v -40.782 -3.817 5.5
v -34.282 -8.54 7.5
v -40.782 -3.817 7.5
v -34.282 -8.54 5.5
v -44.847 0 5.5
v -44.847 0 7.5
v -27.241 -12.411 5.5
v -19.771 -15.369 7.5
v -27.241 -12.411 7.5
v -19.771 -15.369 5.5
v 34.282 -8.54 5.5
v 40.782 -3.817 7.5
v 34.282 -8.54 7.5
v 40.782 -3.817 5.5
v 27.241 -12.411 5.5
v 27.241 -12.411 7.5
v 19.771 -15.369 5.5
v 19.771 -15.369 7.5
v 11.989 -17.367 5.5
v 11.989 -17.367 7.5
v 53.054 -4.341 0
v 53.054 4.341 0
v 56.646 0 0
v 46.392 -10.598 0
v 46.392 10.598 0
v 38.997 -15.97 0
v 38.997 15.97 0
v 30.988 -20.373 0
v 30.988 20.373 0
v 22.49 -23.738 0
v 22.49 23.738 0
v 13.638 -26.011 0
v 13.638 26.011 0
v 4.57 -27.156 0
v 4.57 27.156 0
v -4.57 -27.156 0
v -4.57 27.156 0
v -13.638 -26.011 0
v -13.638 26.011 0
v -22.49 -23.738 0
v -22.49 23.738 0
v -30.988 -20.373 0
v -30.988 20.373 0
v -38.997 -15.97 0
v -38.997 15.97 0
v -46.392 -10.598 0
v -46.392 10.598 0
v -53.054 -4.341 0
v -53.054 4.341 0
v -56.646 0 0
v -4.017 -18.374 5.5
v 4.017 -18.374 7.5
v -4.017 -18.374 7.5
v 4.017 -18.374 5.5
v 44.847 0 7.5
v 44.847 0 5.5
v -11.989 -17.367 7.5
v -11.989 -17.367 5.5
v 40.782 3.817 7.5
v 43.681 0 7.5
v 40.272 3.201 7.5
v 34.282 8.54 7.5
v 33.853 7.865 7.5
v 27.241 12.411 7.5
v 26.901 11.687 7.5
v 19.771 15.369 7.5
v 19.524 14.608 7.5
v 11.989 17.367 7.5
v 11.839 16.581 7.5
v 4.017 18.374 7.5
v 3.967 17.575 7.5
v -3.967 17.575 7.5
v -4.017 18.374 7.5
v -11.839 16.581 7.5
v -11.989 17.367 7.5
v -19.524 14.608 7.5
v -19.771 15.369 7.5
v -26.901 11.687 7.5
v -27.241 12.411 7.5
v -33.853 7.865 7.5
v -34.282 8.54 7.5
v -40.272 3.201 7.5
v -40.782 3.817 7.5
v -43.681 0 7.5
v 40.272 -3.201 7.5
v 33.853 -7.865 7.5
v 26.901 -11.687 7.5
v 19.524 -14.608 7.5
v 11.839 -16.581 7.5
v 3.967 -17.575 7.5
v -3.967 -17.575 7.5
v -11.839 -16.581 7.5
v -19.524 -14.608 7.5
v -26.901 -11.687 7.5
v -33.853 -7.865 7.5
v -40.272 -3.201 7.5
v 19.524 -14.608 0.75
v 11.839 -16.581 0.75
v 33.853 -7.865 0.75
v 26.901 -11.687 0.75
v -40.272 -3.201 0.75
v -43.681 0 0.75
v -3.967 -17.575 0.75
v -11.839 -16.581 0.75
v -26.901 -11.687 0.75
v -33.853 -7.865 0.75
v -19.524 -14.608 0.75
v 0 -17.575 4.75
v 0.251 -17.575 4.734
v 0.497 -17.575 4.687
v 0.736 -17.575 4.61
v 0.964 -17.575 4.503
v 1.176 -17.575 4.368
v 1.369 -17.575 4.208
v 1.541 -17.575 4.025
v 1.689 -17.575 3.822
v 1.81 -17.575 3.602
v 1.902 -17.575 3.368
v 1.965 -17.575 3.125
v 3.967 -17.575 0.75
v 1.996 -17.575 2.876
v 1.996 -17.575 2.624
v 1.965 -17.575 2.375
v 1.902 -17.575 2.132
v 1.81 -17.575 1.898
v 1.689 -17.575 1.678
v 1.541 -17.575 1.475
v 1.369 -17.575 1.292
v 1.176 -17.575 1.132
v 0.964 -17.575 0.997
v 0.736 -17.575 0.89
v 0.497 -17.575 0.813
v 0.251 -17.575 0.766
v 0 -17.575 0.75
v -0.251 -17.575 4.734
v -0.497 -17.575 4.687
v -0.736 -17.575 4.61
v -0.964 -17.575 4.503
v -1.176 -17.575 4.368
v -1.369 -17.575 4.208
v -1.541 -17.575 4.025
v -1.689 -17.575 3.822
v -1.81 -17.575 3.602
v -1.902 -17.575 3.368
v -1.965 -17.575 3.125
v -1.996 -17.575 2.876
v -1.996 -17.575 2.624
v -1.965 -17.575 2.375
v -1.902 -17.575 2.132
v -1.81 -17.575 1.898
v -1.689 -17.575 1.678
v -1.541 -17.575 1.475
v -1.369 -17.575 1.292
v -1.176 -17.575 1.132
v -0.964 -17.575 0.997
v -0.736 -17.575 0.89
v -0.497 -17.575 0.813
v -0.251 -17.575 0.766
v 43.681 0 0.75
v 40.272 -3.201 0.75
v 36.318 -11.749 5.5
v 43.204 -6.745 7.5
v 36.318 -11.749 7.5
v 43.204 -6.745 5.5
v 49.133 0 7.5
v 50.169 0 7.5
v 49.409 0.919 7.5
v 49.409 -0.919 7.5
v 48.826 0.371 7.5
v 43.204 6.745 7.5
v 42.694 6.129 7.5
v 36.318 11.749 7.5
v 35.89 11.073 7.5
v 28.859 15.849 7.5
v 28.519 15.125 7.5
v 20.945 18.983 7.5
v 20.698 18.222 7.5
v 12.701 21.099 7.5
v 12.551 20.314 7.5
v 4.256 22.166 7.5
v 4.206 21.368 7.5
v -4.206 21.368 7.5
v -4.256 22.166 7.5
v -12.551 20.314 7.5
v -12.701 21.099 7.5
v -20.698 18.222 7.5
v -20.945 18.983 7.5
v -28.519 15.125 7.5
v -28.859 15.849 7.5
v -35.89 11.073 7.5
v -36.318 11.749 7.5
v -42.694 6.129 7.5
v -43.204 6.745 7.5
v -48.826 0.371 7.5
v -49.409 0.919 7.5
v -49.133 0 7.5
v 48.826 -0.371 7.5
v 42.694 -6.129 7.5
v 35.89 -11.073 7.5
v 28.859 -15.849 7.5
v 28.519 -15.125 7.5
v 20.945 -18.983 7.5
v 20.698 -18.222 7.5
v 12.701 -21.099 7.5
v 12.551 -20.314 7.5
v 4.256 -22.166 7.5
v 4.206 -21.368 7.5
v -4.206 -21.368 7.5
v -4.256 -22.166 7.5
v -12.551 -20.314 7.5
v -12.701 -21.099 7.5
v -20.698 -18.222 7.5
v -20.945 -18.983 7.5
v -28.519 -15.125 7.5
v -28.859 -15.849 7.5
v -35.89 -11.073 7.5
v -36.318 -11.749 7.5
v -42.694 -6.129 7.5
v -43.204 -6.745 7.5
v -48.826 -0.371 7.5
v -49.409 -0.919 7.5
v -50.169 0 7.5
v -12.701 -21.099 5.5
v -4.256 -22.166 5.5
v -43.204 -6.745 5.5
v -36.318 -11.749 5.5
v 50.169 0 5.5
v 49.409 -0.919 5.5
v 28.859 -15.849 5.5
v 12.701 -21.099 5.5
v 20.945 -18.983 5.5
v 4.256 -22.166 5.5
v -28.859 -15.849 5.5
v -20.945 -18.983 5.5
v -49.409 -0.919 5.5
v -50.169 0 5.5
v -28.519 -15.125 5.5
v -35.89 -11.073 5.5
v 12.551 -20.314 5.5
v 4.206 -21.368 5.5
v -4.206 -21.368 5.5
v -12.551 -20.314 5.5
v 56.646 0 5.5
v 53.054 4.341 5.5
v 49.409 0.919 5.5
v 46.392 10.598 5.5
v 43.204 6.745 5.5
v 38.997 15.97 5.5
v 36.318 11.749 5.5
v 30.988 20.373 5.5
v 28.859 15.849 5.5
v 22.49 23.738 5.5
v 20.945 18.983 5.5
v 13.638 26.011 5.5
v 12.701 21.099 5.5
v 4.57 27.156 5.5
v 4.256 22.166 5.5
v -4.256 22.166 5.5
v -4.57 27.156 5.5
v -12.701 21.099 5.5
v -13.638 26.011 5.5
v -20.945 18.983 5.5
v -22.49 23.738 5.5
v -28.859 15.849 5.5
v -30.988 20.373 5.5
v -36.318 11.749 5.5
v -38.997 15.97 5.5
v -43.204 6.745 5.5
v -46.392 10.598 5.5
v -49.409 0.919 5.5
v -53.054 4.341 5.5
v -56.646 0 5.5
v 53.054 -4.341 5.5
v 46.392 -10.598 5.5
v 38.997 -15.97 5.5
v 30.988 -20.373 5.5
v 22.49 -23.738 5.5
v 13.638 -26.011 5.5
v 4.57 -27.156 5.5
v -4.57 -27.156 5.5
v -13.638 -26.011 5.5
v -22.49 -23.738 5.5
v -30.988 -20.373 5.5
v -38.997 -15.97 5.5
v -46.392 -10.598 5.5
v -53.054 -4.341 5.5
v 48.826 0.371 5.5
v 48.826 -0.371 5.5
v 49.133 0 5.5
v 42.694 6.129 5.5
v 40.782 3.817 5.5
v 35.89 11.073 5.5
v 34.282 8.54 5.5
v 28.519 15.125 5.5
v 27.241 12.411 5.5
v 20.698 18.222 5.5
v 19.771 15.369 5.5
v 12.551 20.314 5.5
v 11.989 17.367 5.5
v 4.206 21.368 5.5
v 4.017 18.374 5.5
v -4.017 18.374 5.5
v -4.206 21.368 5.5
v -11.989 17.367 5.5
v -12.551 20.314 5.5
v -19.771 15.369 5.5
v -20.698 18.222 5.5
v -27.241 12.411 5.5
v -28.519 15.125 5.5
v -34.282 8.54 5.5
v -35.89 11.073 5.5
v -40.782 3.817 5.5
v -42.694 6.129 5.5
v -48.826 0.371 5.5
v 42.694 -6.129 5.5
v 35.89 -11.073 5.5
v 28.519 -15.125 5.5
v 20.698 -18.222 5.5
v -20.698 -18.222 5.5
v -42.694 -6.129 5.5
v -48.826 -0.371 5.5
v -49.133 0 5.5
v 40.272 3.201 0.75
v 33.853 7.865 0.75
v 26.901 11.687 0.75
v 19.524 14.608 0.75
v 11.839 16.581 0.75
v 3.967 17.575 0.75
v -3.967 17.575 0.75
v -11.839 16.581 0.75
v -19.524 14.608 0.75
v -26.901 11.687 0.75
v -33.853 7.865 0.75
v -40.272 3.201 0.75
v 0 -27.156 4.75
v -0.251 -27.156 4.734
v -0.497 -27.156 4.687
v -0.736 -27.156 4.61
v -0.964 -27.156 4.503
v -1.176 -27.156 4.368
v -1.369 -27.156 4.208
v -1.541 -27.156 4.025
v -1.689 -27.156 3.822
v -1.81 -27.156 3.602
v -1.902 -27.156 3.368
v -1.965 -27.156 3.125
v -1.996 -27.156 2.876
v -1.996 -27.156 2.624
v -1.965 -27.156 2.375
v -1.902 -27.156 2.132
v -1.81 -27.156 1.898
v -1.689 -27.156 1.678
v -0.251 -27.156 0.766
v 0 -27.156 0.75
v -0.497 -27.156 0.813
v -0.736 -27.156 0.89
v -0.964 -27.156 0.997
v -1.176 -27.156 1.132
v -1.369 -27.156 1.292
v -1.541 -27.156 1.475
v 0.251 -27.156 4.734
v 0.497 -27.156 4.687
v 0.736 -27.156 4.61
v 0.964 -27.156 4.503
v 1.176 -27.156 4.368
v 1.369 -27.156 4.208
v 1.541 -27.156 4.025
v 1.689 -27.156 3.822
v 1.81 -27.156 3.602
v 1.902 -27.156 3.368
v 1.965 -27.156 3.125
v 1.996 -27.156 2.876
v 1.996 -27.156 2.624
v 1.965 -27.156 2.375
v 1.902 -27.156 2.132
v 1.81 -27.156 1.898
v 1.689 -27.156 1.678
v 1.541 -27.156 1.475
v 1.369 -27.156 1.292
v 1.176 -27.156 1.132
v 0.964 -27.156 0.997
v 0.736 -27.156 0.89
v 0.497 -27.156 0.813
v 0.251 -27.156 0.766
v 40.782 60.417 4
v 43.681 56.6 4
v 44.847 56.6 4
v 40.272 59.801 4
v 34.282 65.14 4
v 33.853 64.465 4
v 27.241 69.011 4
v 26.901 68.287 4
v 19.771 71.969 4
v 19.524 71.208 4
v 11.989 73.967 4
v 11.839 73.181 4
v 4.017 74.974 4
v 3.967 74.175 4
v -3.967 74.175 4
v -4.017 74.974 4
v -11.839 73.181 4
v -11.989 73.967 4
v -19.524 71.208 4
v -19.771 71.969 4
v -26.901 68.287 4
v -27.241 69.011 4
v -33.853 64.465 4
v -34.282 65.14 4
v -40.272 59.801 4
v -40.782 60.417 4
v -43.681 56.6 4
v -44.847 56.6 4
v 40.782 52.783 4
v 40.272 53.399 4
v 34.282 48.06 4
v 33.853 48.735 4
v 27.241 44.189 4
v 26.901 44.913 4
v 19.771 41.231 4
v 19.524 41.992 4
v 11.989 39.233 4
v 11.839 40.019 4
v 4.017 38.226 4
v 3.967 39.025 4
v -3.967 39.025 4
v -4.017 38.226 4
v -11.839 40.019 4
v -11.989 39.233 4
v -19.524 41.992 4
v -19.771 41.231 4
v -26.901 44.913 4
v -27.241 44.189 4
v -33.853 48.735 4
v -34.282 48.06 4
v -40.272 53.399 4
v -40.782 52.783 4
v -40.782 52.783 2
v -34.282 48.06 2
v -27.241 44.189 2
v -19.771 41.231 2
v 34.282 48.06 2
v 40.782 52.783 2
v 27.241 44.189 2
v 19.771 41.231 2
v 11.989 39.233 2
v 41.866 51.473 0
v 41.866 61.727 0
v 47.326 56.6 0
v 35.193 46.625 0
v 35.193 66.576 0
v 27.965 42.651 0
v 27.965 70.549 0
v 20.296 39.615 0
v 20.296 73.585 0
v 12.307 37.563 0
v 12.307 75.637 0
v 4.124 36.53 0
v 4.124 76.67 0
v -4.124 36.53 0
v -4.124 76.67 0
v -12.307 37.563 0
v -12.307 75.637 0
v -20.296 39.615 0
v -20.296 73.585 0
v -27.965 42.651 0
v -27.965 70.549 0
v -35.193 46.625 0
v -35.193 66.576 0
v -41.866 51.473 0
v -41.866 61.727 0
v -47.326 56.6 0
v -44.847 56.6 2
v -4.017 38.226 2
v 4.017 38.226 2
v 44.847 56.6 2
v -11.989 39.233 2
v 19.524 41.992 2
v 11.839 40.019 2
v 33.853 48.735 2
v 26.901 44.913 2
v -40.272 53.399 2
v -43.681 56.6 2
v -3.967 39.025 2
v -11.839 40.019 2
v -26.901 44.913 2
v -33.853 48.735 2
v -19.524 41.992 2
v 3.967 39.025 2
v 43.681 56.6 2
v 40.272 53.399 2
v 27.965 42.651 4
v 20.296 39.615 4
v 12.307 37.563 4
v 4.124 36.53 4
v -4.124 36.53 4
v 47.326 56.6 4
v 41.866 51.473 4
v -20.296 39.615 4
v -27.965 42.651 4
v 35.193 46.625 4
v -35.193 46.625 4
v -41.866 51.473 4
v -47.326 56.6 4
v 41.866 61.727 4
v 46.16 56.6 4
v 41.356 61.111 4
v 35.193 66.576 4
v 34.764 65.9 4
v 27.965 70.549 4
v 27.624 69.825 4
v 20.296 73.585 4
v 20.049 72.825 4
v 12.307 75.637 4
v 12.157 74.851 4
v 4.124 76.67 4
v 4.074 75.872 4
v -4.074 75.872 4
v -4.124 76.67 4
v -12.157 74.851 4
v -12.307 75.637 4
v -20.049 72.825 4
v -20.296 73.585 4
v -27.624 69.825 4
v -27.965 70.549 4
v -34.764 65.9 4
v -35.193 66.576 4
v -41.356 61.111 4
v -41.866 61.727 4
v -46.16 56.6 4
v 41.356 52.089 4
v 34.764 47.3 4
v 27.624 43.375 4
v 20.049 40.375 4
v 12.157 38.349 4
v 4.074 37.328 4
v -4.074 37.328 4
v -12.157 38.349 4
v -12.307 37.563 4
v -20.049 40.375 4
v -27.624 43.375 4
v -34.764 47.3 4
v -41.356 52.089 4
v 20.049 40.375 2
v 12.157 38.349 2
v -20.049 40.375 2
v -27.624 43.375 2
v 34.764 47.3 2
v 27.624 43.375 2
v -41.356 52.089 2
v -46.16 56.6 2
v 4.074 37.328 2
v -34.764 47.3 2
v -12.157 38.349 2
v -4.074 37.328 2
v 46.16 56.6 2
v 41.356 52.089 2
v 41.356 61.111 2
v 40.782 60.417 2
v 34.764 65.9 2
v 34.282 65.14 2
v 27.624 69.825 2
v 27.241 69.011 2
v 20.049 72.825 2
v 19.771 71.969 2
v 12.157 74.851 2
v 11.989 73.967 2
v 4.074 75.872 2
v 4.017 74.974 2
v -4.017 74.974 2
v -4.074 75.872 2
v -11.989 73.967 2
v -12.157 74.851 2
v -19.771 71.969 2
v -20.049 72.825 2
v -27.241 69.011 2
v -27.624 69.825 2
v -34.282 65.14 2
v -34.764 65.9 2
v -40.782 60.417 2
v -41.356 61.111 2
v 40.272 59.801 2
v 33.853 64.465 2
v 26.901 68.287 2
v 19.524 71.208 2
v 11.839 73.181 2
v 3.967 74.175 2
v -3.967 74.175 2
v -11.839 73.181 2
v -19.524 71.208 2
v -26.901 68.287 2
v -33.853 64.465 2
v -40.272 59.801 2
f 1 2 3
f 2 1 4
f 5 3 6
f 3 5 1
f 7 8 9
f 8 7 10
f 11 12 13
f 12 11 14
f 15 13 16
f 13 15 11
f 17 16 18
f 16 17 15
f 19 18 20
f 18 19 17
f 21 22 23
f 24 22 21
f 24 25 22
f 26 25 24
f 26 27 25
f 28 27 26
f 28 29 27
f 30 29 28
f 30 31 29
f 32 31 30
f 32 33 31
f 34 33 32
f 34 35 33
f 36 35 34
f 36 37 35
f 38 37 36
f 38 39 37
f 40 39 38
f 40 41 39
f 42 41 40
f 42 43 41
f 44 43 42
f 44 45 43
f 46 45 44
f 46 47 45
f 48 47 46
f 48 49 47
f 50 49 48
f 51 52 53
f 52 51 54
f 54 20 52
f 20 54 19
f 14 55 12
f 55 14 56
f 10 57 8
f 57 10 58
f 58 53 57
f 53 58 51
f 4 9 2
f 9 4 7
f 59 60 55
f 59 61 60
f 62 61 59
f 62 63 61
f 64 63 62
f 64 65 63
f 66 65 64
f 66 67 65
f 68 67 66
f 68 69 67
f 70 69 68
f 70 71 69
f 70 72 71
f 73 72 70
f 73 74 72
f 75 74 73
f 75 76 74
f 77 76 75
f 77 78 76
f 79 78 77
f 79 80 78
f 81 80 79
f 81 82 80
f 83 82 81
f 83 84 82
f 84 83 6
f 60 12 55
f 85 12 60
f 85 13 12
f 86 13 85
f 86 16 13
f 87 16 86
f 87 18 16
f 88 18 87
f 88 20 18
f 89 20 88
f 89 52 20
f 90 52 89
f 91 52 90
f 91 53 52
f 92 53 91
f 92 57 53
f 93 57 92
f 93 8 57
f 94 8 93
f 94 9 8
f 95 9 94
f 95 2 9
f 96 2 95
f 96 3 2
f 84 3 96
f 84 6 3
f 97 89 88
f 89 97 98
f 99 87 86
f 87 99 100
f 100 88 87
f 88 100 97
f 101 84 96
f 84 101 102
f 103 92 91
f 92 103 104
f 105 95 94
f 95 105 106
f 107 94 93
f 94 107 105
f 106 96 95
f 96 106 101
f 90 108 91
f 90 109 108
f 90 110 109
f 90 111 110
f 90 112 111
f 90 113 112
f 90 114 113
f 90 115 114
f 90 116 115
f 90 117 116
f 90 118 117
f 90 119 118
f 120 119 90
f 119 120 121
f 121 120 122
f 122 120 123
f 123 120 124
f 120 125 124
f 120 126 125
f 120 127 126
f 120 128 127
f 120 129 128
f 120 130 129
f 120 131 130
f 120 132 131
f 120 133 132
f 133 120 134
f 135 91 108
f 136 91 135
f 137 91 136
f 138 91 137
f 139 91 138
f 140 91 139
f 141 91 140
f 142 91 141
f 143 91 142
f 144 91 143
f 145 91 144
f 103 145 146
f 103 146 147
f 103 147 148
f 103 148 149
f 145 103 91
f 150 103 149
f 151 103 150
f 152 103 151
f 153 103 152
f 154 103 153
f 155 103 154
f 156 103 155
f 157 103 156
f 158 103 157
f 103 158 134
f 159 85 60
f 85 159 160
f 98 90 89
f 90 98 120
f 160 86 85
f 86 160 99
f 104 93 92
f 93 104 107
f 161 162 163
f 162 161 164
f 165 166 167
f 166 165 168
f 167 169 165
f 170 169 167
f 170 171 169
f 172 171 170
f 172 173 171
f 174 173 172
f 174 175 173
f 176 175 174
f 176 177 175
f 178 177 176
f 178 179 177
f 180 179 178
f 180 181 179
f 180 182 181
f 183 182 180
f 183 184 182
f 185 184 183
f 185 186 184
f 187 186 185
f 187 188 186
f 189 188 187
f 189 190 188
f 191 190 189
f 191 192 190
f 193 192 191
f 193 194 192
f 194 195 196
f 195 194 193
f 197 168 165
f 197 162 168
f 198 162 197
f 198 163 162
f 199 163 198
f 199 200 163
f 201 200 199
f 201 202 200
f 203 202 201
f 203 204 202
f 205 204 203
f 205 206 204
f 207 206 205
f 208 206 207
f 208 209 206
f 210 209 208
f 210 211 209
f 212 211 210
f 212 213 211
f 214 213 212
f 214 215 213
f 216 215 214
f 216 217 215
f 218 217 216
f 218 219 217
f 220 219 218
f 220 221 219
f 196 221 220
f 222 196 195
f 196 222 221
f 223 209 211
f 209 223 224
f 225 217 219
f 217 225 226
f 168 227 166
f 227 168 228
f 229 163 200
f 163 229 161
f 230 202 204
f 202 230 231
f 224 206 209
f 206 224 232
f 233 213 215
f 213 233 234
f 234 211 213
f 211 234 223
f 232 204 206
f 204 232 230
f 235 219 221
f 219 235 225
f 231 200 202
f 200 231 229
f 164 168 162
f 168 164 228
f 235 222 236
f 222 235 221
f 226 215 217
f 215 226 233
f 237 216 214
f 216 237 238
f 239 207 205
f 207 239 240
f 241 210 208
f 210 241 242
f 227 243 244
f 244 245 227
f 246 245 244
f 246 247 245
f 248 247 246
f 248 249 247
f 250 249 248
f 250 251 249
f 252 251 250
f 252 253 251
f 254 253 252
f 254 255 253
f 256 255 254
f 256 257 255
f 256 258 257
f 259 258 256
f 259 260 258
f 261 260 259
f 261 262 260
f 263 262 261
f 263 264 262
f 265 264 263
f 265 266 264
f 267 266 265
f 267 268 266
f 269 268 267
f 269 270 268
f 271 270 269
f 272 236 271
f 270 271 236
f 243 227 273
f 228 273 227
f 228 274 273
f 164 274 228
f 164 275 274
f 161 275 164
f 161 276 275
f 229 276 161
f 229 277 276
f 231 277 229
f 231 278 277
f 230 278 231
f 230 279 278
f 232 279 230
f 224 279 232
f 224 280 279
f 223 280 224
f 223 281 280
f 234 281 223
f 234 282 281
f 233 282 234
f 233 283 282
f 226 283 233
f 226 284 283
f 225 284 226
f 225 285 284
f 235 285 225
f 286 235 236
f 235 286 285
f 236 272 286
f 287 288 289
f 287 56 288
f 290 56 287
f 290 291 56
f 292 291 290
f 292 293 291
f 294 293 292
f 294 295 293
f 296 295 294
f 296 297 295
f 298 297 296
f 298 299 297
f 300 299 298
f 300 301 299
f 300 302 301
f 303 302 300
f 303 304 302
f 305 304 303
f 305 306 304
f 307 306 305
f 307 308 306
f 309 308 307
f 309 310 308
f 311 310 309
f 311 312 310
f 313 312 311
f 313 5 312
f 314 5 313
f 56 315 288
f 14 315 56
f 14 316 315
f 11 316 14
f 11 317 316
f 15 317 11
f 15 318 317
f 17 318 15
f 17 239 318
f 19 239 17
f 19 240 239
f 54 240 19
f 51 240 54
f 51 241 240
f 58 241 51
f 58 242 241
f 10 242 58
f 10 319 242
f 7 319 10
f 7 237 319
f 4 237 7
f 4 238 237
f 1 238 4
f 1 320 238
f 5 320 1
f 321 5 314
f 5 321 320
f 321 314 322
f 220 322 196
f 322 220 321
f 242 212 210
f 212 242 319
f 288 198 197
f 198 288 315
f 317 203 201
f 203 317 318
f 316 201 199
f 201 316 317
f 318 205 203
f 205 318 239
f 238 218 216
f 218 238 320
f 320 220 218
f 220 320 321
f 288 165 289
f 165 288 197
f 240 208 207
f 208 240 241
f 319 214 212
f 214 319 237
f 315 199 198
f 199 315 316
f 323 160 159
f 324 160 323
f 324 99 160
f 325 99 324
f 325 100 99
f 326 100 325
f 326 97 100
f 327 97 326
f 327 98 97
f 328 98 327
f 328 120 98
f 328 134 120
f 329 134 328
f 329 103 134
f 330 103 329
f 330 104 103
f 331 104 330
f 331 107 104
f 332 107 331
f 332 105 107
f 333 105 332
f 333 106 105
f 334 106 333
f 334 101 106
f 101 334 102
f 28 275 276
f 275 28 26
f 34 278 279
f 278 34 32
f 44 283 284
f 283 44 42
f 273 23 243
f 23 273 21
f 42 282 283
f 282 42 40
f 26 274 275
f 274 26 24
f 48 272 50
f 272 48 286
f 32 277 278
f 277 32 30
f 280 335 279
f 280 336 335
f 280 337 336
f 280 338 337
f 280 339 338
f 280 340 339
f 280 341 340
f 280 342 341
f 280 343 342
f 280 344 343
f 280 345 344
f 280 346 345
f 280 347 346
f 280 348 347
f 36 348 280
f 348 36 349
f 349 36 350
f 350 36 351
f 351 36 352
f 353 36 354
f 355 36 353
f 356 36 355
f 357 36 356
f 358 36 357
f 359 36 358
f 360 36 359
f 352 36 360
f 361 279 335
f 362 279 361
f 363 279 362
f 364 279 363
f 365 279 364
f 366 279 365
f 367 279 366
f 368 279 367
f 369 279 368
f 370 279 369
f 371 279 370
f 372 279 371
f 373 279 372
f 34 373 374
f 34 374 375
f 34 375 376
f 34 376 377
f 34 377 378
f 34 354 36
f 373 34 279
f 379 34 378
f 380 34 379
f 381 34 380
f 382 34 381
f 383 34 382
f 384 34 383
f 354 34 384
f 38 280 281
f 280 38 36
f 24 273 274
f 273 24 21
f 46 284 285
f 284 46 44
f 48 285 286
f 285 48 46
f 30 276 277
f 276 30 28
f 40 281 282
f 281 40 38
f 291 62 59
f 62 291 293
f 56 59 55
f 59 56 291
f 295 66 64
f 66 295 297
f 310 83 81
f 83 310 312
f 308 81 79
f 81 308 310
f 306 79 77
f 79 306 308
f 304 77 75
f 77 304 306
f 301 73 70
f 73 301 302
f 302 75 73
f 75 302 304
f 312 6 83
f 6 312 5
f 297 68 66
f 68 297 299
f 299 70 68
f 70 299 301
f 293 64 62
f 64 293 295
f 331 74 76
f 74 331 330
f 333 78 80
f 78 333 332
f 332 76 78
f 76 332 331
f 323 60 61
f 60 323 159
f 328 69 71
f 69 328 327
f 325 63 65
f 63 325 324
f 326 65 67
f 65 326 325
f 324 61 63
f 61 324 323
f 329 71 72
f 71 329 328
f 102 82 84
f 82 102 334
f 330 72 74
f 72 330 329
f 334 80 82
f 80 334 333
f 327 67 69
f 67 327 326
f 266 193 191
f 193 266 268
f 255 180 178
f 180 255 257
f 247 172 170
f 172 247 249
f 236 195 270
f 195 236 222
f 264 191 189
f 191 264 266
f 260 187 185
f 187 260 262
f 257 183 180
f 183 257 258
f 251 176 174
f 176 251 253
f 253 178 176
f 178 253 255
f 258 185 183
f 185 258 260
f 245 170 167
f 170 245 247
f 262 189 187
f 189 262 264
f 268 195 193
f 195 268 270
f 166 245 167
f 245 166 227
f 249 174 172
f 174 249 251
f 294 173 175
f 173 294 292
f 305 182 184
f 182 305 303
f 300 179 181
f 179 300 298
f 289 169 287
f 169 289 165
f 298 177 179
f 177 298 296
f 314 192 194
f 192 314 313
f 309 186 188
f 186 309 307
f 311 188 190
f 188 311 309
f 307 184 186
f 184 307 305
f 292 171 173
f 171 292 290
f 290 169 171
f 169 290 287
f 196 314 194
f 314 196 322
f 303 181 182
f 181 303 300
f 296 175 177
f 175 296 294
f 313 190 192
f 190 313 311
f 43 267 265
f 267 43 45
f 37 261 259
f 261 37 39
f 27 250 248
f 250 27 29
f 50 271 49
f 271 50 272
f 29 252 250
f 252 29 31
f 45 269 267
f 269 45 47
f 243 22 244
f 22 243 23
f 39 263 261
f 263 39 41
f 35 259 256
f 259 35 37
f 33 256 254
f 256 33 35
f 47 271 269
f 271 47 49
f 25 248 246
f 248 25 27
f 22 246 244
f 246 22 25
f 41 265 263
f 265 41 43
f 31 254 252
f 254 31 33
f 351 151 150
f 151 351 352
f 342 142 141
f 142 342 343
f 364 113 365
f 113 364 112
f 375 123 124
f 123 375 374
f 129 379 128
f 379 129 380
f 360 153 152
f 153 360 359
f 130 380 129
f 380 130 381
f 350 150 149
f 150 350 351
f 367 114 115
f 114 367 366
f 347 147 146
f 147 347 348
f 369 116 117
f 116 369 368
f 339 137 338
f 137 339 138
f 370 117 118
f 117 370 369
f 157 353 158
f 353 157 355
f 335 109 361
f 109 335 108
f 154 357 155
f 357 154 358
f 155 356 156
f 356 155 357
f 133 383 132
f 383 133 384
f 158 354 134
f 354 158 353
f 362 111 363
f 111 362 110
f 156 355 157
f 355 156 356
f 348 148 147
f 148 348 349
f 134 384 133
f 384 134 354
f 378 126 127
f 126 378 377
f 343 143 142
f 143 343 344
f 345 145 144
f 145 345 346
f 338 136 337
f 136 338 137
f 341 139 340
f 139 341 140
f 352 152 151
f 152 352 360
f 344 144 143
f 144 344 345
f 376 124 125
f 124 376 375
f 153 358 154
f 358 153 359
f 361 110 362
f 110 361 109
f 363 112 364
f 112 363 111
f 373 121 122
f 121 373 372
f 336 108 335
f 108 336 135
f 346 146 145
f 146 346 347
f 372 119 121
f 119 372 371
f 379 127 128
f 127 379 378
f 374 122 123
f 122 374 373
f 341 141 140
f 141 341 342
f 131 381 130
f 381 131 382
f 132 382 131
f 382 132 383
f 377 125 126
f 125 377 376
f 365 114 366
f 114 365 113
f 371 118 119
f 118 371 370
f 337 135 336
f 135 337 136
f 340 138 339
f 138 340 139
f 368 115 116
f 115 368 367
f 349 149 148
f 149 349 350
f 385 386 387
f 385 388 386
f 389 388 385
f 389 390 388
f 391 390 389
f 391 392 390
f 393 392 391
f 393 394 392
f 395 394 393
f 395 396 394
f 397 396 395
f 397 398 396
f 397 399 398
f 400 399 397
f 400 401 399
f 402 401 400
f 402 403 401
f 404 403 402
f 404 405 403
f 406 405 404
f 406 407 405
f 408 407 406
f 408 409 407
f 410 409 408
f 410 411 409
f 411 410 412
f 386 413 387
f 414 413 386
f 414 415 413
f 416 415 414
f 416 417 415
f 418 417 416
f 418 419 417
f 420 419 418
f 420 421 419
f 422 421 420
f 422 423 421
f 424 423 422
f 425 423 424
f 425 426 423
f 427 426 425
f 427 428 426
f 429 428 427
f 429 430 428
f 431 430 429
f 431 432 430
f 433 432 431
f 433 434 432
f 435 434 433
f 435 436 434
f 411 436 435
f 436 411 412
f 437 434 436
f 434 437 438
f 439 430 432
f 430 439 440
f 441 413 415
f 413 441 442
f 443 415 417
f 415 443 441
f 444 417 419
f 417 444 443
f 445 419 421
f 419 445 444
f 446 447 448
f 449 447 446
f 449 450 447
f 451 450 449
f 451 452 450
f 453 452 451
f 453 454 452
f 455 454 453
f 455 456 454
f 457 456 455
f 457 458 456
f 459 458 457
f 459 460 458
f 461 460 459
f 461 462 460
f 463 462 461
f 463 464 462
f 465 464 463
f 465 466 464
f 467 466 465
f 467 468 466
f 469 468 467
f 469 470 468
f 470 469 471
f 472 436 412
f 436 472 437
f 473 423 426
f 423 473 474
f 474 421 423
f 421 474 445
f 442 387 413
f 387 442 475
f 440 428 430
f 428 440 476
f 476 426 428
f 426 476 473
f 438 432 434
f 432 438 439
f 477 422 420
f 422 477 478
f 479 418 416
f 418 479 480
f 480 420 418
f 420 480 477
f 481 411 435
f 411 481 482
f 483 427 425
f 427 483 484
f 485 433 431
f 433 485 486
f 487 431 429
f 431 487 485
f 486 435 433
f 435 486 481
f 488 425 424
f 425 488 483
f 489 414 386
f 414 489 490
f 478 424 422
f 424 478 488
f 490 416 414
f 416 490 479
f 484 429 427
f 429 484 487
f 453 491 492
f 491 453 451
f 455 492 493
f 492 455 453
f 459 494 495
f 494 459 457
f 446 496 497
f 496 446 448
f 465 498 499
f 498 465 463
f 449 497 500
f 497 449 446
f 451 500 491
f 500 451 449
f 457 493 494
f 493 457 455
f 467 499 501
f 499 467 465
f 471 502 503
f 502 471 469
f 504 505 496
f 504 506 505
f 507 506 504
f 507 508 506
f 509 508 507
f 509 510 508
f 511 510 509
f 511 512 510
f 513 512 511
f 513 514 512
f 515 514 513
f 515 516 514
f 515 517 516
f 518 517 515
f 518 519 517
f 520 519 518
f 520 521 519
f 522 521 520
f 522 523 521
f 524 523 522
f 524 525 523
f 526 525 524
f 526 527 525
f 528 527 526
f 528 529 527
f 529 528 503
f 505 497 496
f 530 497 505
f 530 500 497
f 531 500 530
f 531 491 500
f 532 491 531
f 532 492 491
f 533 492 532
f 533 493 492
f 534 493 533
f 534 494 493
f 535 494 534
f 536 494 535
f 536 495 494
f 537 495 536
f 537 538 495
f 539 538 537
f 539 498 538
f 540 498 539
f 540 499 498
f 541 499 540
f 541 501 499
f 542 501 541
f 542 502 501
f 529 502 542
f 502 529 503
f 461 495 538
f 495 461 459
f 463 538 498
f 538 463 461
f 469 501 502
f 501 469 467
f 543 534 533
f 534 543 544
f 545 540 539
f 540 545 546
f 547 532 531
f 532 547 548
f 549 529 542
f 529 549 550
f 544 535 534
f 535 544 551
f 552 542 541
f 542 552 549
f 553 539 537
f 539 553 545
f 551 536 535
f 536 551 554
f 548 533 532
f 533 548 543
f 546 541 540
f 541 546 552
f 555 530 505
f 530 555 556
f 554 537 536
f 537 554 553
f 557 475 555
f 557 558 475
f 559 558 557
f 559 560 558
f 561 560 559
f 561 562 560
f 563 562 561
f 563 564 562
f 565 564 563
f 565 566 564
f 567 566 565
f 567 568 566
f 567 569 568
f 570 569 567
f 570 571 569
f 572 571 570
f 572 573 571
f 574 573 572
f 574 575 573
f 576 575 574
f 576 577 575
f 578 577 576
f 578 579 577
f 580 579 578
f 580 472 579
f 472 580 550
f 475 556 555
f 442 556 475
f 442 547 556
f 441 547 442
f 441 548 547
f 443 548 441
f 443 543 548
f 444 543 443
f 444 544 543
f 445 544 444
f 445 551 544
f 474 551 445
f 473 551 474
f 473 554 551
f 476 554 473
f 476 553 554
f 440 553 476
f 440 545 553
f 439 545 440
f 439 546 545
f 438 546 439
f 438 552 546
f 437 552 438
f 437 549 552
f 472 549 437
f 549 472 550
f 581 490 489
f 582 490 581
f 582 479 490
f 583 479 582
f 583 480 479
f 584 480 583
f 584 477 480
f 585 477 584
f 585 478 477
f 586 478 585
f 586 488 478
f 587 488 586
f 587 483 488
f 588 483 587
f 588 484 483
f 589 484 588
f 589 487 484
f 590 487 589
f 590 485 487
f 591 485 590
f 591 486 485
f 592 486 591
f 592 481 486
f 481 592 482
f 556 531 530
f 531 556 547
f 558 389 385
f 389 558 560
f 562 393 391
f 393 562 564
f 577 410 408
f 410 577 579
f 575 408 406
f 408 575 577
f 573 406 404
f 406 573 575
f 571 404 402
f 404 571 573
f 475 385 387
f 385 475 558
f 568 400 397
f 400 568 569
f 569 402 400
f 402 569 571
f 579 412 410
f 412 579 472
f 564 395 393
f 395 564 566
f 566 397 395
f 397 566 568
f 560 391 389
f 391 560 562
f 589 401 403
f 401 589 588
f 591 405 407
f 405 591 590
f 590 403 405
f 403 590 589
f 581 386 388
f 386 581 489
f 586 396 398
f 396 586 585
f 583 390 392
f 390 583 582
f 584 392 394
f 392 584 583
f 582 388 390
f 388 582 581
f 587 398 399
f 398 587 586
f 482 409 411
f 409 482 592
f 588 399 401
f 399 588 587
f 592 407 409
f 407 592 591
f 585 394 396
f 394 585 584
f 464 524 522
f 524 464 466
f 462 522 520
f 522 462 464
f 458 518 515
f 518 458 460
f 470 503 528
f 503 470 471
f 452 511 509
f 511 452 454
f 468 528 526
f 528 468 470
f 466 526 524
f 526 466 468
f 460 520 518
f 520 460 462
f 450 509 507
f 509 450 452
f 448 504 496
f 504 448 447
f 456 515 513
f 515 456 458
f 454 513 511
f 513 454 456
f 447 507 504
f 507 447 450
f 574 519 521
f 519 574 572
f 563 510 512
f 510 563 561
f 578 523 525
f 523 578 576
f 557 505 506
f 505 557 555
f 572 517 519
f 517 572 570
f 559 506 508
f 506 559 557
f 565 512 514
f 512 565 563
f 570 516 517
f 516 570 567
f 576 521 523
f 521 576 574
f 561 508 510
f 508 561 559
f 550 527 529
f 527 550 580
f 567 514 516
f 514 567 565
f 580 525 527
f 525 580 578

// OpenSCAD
/* [General] */
// The width of the Lithophane
s = 90;
// The depth of the Lithophane
h = 18.5;
// Thickness of the walls holding the Lithophane
walls = 0.8;
// Height of the Lithophane walls
height = 2;

/* [Bottom] */
// Thickness of the bottom part of the Lithophane
thickness = 3;
// Padding of the bottom Part to the cable
bottom = 0.75;
// With of the brim
brim = 5;
// Diameter of the Cable
cableDiameter = 4;
// Cable offset in degrees
cableOffset = 90;

/* [Top] */
// Height of the top part walls
top = 2;
// Thickness of the top part of the Lithophane
thicknessTop = 0.9;

/* [Part] */
// Part to render
part = "both"; // [both, top, bottom]
// Spacing between parts
spacing = 10;

/* [Hidden] */
$fn = 50;
cableRadius = cableDiameter / 2;
rInner = h / 2 + (s * s) / (8 * h);

rOuter = rInner + thickness;
heightTotal = height + bottom * 2 + cableDiameter;

rBrim = rOuter + walls + brim;
rHole = rInner - walls;

rOuterTop = rInner + thicknessTop;
heightTotalTop = height + top;

if(part == "bottom") {
  bottom();
}

else if(part == "top") {
  top();
}

else if(part == "both") {
  bottom();
  
  translate([0, (h + walls) * 2 + thickness + brim + spacing, 0])
    top();
}

module bottom() {
  difference() {
    group() {
      bottomHalf();
      rotate([0, 0, 180])
        bottomHalf();
    }
    
    rotate([0, 90, cableOffset])
      translate([-cableRadius - bottom, 0, -s])
        cylinder(h= s, r=cableRadius);
  }
}

module top() {
  topHalf();
  rotate([0, 0, 180])
    topHalf();
}

module topHalf() {
  translate([0, rInner - h, 0]) {
    difference() {
      segment(top, heightTotalTop, rOuterTop);

      translate([-rBrim - 1, -rInner + h, -1])
        cube([(rBrim + 1) * 2, (rBrim + 1) * 2, heightTotalTop + 2]);
    }
  }
}

module bottomHalf() {
  translate([0, rInner - h, 0]) {
    difference() {
      segment(bottom * 2 + cableDiameter, heightTotal, rOuter);

      translate([-rBrim - 1, -rInner + h, -1])
        cube([(rBrim + 1) * 2, (rBrim + 1) * 2, heightTotal + 2]);
      
      hole();
    }
  }
  
  brim();
}

module segment(height, heightTotal, rOuter) {
  difference() {
    cylinder(r = rInner, h = heightTotal);

    translate([0, 0, -1])
      cylinder(r = rInner - walls, h = heightTotal + 2);
  }

  difference() {
    group() {
      cylinder(r = rOuter + walls, h = heightTotal);
    }

    translate([0, 0, height])
      cylinder(r = rOuter, h = heightTotal + 2);
  }
}

module hole() {
  translate([0, 0, bottom])
    cylinder(r = rHole, h = heightTotal + 2);
}

module brim() {
  translate([0, rInner - h, 0]) {
    difference() {
      cylinder(r = rBrim, h = bottom * 2 + cableDiameter);

      translate([-rBrim - 1, -rInner + h, -1])
        cube([(rBrim + 1) * 2, (rBrim + 1) * 2, heightTotal + 2]);

      hole();
    }
  }
}
